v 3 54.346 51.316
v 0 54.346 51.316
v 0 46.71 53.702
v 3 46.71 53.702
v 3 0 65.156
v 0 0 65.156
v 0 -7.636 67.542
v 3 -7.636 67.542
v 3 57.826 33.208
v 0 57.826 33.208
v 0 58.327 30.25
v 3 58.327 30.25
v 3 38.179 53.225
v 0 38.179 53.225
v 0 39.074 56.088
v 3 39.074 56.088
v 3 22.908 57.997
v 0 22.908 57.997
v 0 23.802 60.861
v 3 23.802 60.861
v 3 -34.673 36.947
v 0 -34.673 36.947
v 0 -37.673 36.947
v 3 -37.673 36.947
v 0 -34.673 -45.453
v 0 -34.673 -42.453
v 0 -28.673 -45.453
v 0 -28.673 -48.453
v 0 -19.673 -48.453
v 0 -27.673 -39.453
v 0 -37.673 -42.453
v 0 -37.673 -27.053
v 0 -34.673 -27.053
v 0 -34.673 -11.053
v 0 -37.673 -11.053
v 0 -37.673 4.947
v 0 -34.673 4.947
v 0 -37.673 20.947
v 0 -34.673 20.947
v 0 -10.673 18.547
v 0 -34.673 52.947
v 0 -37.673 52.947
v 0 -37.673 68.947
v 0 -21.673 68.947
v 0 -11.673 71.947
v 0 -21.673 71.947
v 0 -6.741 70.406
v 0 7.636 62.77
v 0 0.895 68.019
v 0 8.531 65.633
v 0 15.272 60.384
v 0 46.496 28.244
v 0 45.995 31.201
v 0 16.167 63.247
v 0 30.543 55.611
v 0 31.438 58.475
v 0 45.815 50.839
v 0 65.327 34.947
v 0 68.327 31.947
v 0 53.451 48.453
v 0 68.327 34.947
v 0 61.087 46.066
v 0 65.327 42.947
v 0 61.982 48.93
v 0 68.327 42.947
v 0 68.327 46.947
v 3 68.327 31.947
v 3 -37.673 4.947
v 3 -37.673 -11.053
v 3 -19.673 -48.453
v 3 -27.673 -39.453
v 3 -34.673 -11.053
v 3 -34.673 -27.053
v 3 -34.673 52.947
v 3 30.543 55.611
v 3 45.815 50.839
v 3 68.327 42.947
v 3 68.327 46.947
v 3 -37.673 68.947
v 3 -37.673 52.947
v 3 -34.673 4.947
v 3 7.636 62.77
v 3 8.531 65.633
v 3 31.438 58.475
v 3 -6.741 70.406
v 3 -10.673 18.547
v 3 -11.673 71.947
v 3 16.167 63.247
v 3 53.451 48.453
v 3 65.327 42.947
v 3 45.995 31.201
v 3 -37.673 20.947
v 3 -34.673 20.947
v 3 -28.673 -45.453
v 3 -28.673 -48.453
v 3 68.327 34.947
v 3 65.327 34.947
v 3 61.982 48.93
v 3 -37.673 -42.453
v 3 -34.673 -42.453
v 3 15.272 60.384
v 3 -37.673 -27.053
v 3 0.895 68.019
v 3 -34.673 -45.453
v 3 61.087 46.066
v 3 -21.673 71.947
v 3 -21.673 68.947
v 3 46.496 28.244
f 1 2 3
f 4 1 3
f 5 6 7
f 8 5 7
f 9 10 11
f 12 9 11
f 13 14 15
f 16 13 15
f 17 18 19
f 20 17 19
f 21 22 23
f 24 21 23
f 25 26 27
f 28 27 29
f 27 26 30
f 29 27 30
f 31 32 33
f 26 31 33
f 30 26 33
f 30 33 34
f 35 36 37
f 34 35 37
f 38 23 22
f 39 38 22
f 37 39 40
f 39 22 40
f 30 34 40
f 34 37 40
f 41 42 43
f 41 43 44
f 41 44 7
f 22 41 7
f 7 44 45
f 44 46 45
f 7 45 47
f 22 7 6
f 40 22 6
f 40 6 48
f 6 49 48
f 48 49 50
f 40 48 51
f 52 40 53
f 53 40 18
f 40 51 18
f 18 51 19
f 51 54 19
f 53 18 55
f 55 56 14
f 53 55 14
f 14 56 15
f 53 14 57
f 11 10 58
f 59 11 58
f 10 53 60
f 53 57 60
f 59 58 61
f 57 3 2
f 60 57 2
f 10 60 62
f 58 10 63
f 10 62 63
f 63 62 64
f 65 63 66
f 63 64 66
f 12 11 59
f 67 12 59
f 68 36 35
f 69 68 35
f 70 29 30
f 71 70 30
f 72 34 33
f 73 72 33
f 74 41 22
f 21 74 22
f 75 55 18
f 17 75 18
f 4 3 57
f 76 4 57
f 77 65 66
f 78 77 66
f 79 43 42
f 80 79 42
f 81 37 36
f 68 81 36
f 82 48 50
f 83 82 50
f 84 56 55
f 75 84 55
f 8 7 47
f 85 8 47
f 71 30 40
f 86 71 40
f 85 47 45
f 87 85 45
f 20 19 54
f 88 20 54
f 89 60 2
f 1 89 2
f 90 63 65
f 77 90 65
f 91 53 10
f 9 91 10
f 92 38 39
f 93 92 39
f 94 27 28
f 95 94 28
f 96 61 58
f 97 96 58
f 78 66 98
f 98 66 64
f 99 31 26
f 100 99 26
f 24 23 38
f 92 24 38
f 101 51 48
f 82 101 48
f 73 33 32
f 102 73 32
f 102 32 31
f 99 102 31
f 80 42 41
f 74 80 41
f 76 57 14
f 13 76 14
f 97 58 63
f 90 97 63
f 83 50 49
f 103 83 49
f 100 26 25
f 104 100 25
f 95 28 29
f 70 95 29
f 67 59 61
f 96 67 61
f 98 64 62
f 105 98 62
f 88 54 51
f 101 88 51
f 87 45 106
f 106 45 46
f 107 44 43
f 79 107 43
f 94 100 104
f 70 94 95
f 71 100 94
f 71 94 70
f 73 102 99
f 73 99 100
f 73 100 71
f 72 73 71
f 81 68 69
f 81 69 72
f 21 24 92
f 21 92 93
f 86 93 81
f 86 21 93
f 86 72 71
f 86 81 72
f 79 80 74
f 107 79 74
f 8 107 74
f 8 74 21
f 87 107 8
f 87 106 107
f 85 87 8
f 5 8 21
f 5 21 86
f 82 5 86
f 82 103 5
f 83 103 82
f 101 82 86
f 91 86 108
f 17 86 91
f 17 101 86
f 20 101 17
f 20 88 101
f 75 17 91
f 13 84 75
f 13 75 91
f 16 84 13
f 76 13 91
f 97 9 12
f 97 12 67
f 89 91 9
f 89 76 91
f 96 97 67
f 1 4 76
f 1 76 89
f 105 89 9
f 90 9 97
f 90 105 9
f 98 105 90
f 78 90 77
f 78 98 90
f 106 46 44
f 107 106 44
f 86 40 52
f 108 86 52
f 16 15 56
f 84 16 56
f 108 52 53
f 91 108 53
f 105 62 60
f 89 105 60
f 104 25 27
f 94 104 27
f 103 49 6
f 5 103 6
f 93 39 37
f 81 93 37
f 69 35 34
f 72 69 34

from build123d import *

# Parameters (mm, degrees)
F1_DEPTH = 3


with BuildPart() as f1:
    # F0 (on Right) → F1 (new body)
    with BuildSketch(Plane.YZ):
        Polygon((-28.672605, -45.453316), (-28.672605, -48.453316), (-19.672605, -48.453316), (-27.672605, -39.453316), (-10.672605, 18.546684), (46.496383, 28.243702), (45.994689, 31.201455), (57.8257, 33.208234), (58.327395, 30.250482), (68.327395, 31.946684), (68.327395, 34.946684), (65.327395, 34.946684), (65.327395, 42.946684), (68.327395, 42.946684), (68.327395, 46.946684), (61.981544, 48.929763), (61.086719, 46.066323), (53.450879, 48.452523), (54.345704, 51.315963), (46.709864, 53.702163), (45.815039, 50.838723), (38.179199, 53.224923), (39.074024, 56.088362), (31.438184, 58.474562), (30.543359, 55.611122), (22.907519, 57.997322), (23.802344, 60.860762), (16.166505, 63.246962), (15.27168, 60.383522), (7.63584, 62.769722), (8.530665, 65.633162), (0.894825, 68.019362), (0, 65.155922), (-7.63584, 67.542122), (-6.741015, 70.405562), (-11.672605, 71.946684), (-21.672605, 71.946684), (-21.672605, 68.946684), (-37.672605, 68.946684), (-37.672605, 52.946684), (-34.672605, 52.946684), (-34.672605, 36.946684), (-37.672605, 36.946684), (-37.672605, 20.946684), (-34.672605, 20.946684), (-34.672605, 4.946684), (-37.672605, 4.946684), (-37.672605, -11.053316), (-34.672605, -11.053316), (-34.672605, -27.053316), (-37.672605, -27.053316), (-37.672605, -42.453316), (-34.672605, -42.453316), (-34.672605, -45.453316), align=None)
    extrude(amount=F1_DEPTH)


solid = f1.part
